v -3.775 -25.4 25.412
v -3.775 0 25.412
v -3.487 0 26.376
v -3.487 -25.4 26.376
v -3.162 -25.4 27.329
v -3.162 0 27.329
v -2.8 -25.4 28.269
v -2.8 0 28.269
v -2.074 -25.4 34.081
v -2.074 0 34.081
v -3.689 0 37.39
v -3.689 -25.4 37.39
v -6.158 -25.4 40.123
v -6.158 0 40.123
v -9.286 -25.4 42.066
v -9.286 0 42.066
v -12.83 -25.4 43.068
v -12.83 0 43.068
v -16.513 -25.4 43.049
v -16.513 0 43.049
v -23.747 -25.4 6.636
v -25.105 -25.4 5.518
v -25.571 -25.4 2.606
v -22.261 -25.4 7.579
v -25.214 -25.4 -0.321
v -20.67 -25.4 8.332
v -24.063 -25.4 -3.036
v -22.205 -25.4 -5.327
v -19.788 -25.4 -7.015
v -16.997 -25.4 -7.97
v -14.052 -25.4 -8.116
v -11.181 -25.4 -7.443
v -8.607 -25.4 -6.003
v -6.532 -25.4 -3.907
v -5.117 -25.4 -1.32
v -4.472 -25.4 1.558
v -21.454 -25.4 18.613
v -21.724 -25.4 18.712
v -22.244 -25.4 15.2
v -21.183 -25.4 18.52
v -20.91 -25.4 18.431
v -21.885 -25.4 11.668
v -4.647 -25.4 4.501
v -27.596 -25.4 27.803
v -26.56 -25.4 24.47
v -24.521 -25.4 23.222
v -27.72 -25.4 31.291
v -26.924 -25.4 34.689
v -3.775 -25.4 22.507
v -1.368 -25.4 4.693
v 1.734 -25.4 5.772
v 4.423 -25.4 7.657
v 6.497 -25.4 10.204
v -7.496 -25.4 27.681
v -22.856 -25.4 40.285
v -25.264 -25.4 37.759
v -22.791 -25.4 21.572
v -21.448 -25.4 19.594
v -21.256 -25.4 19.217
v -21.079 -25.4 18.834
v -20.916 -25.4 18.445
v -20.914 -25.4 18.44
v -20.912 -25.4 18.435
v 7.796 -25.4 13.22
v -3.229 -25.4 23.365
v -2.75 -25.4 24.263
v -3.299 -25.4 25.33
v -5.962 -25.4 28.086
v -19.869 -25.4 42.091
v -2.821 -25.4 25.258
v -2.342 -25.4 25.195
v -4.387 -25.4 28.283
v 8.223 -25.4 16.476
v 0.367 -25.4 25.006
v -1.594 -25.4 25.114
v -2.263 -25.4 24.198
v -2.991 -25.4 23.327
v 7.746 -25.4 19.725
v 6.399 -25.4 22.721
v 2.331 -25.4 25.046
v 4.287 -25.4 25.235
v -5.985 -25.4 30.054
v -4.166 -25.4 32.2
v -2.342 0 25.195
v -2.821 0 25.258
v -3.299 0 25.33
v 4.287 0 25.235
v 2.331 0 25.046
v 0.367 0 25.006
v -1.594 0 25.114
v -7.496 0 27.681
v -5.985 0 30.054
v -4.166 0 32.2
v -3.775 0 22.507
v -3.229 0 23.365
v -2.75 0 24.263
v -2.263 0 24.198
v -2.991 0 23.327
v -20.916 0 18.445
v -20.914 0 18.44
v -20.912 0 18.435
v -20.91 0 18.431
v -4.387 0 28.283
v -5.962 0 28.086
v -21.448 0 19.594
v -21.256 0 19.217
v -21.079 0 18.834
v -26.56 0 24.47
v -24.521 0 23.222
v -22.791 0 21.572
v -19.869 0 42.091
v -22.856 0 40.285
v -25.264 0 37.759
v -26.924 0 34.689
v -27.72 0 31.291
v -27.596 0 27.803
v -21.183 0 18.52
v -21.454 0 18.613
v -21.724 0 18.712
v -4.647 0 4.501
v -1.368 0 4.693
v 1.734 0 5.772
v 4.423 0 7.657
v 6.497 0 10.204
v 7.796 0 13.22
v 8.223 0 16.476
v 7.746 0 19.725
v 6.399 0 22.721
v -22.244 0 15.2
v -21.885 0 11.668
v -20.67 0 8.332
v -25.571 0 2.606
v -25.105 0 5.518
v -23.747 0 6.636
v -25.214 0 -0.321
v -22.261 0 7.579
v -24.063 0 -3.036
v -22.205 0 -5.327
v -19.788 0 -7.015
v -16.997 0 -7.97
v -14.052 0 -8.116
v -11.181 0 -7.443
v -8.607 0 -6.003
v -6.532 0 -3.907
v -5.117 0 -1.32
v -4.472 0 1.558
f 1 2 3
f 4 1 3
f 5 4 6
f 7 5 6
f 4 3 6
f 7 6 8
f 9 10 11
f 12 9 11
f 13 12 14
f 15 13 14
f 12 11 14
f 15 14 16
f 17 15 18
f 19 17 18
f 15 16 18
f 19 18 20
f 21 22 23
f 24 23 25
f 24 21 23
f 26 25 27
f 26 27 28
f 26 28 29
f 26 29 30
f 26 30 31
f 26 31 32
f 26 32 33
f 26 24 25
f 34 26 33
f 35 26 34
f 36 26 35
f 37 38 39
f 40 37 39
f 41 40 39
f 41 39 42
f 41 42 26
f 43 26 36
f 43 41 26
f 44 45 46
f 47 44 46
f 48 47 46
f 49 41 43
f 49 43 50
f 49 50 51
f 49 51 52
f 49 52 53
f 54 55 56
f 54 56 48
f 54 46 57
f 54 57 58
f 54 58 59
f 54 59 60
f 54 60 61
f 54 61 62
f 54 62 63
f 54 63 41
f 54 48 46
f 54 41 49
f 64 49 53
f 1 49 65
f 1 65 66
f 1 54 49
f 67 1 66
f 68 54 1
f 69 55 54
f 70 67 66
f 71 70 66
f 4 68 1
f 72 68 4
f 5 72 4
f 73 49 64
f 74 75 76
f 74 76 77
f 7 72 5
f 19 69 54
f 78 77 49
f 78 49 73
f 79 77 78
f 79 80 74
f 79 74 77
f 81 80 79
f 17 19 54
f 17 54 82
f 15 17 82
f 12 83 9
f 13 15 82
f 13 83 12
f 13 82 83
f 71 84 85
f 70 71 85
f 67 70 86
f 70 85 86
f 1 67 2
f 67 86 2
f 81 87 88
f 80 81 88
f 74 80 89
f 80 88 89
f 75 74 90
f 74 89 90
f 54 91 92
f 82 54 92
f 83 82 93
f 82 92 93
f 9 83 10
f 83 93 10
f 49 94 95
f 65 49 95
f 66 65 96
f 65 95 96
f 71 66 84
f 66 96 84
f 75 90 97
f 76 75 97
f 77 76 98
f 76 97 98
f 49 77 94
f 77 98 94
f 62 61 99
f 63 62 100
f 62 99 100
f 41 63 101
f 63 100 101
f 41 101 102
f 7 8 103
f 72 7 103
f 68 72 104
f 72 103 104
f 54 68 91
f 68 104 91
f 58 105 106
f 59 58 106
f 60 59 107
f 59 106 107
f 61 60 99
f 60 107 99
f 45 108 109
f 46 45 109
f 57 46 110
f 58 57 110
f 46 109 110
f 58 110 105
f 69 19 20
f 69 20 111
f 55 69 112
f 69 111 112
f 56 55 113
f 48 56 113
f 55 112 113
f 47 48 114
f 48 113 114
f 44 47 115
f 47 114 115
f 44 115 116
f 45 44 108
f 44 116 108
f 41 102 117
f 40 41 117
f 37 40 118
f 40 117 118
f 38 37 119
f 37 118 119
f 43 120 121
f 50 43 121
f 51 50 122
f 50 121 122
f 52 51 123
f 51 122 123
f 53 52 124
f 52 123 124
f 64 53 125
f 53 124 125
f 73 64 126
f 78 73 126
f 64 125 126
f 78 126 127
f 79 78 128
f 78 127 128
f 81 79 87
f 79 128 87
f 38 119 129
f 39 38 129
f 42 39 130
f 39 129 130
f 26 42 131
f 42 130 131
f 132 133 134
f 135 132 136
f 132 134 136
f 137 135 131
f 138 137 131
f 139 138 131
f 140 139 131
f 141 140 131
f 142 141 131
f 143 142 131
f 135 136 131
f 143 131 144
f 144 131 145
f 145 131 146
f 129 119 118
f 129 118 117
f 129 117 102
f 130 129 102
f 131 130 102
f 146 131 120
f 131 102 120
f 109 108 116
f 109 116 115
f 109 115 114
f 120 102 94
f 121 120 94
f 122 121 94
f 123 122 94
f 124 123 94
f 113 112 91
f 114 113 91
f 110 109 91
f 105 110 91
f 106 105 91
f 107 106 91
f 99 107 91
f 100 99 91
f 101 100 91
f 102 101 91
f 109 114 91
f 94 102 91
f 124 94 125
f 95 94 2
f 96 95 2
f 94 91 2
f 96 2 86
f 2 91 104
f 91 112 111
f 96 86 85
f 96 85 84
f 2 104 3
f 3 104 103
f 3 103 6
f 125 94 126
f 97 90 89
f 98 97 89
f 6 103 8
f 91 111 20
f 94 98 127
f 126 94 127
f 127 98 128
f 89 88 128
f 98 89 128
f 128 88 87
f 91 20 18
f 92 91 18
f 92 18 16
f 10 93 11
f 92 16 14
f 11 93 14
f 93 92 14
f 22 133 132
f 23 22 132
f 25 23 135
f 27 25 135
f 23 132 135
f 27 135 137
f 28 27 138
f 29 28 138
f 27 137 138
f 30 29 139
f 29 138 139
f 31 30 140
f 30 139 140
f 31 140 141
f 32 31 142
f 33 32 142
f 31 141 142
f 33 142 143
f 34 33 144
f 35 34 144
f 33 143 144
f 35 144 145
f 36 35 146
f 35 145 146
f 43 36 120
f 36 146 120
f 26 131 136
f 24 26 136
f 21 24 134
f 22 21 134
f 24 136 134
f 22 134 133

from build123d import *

# Parameters (mm, degrees)
F1_DEPTH = 25.4


with BuildPart() as f1:
    # F0 (on Front) → F1 (new body)
    with BuildSketch(Plane.XZ):
        with BuildLine():
            ThreePointArc((-16.513216, 43.049148), (-26.195994, 36.279159), (-26.559999, 24.469991))
            ThreePointArc((-26.559999, 24.469991), (-23.612281, 22.442675), (-21.448272, 19.593795))
            ThreePointArc((-21.448272, 19.593795), (-21.165753, 19.026637), (-20.915549, 18.444501))
            ThreePointArc((-20.915549, 18.444501), (-20.912799, 18.437567), (-20.910054, 18.430631))
            ThreePointArc((-20.910054, 18.430631), (-21.318885, 18.566069), (-21.724175, 18.711757))
            ThreePointArc((-21.724175, 18.711757), (-22.174114, 13.422676), (-20.669998, 8.332051))
            ThreePointArc((-20.669998, 8.332051), (-23.018125, 7.130784), (-25.1052, 5.518067))
            ThreePointArc((-25.1052, 5.518067), (-15.529674, -8.146325), (-4.646679, 4.50147))
            ThreePointArc((-4.646679, 4.50147), (7.250734, 11.666572), (4.286682, 25.234973))
            ThreePointArc((4.286682, 25.234973), (1.349789, 25.007459), (-1.593968, 25.114212))
            ThreePointArc((-1.593968, 25.114212), (-2.619774, 23.756453), (-3.775427, 22.507351))
            ThreePointArc((-3.775427, 22.507351), (-2.980585, 23.809554), (-2.341596, 25.194905))
            ThreePointArc((-2.341596, 25.194905), (-3.060024, 25.293199), (-3.775427, 25.411526))
            ThreePointArc((-3.775427, 25.411526), (-3.329014, 26.854447), (-2.799791, 28.269095))
            ThreePointArc((-2.799791, 28.269095), (-5.177523, 28.210416), (-7.496269, 27.680819))
            ThreePointArc((-7.496269, 27.680819), (-5.112054, 31.158026), (-2.073727, 34.081041))
            ThreePointArc((-2.073727, 34.081041), (-7.654003, 41.204792), (-16.513216, 43.049148))
        make_face()
    extrude(amount=F1_DEPTH)


solid = f1.part
